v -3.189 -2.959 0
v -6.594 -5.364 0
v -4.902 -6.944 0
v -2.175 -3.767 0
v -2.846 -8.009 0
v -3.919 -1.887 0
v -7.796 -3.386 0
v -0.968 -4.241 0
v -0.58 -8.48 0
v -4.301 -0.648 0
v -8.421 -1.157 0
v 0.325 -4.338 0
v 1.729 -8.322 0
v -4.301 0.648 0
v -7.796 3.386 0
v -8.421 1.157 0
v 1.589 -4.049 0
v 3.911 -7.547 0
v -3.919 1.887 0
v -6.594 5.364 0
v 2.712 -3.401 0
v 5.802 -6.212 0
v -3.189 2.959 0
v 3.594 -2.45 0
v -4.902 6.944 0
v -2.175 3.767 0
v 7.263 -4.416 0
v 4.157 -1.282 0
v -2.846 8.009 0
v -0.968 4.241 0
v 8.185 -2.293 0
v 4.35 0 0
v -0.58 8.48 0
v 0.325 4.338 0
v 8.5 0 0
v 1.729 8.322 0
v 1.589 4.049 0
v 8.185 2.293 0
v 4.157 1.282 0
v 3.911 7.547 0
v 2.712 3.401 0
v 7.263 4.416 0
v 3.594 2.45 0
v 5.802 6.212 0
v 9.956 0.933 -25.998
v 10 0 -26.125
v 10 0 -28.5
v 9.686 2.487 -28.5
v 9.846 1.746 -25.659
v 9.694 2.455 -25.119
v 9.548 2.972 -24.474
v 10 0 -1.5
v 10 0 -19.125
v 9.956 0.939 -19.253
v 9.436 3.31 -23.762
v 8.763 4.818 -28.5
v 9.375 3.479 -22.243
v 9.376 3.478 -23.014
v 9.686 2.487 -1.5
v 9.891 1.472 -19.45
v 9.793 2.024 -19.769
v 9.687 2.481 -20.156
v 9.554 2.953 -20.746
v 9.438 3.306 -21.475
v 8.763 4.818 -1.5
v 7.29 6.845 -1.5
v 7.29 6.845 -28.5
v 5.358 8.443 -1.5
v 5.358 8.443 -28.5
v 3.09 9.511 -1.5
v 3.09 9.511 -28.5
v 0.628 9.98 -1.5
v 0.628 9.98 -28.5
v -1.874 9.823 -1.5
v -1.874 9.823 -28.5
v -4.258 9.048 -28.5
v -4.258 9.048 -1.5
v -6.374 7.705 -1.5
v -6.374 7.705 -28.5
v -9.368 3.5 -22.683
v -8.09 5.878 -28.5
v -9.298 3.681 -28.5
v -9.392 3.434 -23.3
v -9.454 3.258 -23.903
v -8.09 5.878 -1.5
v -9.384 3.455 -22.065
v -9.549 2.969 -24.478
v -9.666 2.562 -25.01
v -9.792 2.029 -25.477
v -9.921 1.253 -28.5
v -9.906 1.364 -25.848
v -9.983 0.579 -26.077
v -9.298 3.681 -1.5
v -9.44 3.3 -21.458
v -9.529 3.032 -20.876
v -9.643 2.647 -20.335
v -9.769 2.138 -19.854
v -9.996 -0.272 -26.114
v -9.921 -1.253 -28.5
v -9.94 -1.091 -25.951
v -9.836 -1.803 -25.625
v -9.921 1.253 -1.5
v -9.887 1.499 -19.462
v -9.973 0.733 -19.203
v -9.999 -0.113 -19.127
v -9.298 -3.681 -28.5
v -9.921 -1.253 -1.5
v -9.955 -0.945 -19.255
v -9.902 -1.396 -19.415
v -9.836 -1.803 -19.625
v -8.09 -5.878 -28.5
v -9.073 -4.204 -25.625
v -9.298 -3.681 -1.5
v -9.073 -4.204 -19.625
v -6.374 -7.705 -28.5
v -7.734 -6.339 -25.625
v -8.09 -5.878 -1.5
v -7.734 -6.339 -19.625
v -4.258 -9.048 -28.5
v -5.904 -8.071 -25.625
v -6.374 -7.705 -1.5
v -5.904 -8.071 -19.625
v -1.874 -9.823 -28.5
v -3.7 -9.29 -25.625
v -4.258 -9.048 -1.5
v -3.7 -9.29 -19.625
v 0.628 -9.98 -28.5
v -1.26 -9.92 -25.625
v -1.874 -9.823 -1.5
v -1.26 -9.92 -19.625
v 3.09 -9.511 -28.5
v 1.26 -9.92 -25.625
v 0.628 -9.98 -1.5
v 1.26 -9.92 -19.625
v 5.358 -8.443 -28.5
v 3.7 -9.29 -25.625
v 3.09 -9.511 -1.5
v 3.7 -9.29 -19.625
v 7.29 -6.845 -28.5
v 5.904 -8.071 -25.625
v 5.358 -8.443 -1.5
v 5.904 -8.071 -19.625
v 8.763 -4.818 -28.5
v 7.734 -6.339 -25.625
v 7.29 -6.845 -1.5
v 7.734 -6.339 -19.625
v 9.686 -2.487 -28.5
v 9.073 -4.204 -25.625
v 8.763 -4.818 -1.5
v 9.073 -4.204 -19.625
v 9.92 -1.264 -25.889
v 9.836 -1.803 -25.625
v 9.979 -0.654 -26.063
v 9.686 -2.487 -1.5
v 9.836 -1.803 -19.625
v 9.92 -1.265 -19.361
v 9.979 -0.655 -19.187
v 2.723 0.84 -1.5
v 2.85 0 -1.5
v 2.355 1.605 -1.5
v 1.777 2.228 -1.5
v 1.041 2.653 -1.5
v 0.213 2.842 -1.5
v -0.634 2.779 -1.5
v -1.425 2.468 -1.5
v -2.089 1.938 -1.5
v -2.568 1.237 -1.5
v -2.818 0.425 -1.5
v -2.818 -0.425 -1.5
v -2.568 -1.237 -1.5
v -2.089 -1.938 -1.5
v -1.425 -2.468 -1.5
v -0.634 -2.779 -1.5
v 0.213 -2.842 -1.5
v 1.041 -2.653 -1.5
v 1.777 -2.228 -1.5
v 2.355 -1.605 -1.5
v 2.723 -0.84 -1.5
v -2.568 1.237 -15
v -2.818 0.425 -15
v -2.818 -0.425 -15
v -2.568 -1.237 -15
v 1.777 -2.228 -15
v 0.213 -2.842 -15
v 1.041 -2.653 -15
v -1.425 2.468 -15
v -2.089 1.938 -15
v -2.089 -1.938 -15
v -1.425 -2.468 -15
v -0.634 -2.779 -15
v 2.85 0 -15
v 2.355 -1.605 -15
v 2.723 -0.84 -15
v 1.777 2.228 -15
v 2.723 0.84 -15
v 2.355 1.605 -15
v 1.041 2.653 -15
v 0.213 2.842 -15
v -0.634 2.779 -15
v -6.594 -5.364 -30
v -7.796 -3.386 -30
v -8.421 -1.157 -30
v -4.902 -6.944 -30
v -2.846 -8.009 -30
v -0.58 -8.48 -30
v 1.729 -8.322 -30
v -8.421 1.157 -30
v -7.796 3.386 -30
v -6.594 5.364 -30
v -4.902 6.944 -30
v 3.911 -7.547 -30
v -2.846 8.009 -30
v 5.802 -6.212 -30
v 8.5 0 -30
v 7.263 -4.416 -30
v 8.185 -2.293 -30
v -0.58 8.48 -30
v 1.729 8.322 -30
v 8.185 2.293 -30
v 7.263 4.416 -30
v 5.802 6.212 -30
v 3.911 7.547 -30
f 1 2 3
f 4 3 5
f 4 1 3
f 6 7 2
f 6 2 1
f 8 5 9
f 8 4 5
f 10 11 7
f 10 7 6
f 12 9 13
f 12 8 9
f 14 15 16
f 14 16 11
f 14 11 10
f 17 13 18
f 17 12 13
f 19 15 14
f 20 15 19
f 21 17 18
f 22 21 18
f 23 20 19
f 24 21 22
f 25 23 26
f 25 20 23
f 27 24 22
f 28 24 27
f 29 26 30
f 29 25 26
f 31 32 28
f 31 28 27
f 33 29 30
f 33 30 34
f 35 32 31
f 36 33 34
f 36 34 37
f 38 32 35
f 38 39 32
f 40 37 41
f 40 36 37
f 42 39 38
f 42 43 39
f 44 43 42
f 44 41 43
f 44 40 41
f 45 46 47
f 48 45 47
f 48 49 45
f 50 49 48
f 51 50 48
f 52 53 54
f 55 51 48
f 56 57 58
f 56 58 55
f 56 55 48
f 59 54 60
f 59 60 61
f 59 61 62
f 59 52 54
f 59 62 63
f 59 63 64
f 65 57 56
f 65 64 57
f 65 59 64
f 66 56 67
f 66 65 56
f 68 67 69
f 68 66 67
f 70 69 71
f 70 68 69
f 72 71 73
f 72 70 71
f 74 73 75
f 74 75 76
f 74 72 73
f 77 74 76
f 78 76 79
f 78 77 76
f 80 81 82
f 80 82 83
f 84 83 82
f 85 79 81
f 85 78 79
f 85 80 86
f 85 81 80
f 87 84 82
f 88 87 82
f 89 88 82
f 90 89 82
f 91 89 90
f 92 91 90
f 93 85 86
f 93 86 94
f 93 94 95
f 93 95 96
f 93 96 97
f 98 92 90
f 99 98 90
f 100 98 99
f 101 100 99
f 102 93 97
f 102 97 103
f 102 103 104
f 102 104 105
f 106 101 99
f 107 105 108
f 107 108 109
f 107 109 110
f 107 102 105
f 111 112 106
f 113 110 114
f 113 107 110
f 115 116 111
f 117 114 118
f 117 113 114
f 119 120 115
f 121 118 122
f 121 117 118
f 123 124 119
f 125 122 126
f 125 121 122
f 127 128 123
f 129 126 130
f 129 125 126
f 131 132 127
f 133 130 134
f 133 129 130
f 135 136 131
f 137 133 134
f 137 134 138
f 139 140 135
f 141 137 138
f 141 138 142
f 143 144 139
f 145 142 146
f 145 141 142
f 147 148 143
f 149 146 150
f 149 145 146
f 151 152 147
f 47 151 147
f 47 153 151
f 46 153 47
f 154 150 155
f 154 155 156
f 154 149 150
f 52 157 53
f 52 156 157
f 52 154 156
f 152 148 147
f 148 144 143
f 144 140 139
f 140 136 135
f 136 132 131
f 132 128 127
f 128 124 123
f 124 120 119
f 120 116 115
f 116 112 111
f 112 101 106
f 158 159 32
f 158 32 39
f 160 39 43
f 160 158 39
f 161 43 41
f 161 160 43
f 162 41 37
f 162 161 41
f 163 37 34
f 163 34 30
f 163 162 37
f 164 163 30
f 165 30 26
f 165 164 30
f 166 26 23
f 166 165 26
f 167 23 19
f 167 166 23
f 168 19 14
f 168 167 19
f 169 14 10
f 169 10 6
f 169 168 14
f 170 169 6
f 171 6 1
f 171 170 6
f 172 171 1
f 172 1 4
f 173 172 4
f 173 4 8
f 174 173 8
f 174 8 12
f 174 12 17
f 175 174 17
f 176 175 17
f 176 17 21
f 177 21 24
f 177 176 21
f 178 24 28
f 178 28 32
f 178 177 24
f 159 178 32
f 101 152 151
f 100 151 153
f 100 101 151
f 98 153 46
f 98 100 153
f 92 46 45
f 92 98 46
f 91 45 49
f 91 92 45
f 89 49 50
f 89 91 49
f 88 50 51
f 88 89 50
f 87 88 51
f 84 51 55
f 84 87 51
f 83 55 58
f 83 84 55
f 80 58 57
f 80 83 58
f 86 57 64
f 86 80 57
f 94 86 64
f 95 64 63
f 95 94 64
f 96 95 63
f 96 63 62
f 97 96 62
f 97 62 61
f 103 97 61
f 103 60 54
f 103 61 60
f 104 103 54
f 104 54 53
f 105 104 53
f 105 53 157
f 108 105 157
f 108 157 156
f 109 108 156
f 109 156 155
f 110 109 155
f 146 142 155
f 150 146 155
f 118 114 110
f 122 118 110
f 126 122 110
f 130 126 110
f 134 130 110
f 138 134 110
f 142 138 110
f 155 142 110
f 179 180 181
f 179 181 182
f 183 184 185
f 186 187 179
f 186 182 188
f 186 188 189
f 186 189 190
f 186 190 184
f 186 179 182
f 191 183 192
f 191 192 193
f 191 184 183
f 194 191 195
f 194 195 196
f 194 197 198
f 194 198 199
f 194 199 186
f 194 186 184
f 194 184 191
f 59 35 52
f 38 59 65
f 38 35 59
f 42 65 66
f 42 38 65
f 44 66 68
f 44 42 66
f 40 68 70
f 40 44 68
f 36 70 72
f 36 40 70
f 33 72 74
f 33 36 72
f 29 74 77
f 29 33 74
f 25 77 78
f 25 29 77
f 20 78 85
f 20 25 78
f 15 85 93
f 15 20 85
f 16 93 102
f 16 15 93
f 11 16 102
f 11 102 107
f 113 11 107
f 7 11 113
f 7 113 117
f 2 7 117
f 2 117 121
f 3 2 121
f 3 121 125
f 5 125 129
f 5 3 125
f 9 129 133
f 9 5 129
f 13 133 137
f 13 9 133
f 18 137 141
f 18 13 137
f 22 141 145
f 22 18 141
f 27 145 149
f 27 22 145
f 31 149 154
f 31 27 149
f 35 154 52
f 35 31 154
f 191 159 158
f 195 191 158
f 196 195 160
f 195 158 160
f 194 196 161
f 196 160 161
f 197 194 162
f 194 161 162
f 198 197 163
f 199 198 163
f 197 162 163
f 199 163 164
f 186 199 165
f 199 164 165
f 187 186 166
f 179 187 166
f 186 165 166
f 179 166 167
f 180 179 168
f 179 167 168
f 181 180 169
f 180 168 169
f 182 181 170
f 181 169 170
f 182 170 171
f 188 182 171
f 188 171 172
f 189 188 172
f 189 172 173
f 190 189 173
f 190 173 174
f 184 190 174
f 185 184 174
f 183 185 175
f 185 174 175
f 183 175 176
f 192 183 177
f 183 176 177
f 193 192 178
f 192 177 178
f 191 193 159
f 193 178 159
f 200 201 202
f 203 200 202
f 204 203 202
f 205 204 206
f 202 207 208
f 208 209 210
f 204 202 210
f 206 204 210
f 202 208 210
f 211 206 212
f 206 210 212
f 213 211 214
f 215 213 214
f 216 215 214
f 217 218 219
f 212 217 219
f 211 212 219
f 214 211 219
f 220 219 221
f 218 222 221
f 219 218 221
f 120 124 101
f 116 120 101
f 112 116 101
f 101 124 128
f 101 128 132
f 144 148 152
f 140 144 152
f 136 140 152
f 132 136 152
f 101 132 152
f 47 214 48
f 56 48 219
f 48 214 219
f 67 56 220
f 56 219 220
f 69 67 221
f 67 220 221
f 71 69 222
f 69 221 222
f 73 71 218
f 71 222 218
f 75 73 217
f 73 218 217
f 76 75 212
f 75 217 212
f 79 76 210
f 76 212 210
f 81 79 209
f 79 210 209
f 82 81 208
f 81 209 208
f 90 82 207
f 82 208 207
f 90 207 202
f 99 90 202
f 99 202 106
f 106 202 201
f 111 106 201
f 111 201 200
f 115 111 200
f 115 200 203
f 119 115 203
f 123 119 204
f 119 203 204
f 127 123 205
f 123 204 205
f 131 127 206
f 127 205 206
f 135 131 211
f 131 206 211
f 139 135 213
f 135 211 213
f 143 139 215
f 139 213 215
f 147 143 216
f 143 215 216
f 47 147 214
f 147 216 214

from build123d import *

# Parameters (mm, degrees)
F0_R          = 10
F1_DEPTH      = 30
F2_R          = 2.85
F3_DEPTH      = 15
F4_R          = 3.5
F5_DEPTH      = 10
F5_DEPTH_BACK = 10
F7_W          = 11.9265963338
F7_H          = 6
F8_DEPTH      = 10
F8_DEPTH_BACK = 10
F9_SIZE       = 1.5


with BuildPart() as f1:
    # F0 (on Top) → F1 (new body)
    with BuildSketch(Plane.XY):
        Circle(F0_R)
    extrude(amount=-F1_DEPTH)

    # F2 (on face) → F3 (cut)
    with BuildSketch(Plane.XY):
        Circle(F2_R)
    extrude(amount=-F3_DEPTH, mode=Mode.SUBTRACT)

    # F4 (on Right) → F5 (cut, two sides)
    with BuildSketch(Plane.YZ) as f5_sk:
        with Locations((0, -22.625)):
            Circle(F4_R)
    extrude(amount=-F5_DEPTH, mode=Mode.SUBTRACT)
    extrude(f5_sk.sketch, amount=F5_DEPTH_BACK, mode=Mode.SUBTRACT)

    # F7 (on Right) → F8 (cut, two sides)
    with BuildSketch(Plane.YZ) as f8_sk:
        with Locations((-5.9632981669, -22.625)):
            Rectangle(F7_W, F7_H)
    extrude(amount=-F8_DEPTH, mode=Mode.SUBTRACT)
    extrude(f8_sk.sketch, amount=F8_DEPTH_BACK, mode=Mode.SUBTRACT)

    # F9
    f9_edges = [f1.edges().sort_by_distance(p)[0] for p in [
        (-2.85, 0, 0),
        (-10, 0, 0),
        (-10, 0, -30),
    ]]
    chamfer(f9_edges, length=F9_SIZE)


solid = f1.part
